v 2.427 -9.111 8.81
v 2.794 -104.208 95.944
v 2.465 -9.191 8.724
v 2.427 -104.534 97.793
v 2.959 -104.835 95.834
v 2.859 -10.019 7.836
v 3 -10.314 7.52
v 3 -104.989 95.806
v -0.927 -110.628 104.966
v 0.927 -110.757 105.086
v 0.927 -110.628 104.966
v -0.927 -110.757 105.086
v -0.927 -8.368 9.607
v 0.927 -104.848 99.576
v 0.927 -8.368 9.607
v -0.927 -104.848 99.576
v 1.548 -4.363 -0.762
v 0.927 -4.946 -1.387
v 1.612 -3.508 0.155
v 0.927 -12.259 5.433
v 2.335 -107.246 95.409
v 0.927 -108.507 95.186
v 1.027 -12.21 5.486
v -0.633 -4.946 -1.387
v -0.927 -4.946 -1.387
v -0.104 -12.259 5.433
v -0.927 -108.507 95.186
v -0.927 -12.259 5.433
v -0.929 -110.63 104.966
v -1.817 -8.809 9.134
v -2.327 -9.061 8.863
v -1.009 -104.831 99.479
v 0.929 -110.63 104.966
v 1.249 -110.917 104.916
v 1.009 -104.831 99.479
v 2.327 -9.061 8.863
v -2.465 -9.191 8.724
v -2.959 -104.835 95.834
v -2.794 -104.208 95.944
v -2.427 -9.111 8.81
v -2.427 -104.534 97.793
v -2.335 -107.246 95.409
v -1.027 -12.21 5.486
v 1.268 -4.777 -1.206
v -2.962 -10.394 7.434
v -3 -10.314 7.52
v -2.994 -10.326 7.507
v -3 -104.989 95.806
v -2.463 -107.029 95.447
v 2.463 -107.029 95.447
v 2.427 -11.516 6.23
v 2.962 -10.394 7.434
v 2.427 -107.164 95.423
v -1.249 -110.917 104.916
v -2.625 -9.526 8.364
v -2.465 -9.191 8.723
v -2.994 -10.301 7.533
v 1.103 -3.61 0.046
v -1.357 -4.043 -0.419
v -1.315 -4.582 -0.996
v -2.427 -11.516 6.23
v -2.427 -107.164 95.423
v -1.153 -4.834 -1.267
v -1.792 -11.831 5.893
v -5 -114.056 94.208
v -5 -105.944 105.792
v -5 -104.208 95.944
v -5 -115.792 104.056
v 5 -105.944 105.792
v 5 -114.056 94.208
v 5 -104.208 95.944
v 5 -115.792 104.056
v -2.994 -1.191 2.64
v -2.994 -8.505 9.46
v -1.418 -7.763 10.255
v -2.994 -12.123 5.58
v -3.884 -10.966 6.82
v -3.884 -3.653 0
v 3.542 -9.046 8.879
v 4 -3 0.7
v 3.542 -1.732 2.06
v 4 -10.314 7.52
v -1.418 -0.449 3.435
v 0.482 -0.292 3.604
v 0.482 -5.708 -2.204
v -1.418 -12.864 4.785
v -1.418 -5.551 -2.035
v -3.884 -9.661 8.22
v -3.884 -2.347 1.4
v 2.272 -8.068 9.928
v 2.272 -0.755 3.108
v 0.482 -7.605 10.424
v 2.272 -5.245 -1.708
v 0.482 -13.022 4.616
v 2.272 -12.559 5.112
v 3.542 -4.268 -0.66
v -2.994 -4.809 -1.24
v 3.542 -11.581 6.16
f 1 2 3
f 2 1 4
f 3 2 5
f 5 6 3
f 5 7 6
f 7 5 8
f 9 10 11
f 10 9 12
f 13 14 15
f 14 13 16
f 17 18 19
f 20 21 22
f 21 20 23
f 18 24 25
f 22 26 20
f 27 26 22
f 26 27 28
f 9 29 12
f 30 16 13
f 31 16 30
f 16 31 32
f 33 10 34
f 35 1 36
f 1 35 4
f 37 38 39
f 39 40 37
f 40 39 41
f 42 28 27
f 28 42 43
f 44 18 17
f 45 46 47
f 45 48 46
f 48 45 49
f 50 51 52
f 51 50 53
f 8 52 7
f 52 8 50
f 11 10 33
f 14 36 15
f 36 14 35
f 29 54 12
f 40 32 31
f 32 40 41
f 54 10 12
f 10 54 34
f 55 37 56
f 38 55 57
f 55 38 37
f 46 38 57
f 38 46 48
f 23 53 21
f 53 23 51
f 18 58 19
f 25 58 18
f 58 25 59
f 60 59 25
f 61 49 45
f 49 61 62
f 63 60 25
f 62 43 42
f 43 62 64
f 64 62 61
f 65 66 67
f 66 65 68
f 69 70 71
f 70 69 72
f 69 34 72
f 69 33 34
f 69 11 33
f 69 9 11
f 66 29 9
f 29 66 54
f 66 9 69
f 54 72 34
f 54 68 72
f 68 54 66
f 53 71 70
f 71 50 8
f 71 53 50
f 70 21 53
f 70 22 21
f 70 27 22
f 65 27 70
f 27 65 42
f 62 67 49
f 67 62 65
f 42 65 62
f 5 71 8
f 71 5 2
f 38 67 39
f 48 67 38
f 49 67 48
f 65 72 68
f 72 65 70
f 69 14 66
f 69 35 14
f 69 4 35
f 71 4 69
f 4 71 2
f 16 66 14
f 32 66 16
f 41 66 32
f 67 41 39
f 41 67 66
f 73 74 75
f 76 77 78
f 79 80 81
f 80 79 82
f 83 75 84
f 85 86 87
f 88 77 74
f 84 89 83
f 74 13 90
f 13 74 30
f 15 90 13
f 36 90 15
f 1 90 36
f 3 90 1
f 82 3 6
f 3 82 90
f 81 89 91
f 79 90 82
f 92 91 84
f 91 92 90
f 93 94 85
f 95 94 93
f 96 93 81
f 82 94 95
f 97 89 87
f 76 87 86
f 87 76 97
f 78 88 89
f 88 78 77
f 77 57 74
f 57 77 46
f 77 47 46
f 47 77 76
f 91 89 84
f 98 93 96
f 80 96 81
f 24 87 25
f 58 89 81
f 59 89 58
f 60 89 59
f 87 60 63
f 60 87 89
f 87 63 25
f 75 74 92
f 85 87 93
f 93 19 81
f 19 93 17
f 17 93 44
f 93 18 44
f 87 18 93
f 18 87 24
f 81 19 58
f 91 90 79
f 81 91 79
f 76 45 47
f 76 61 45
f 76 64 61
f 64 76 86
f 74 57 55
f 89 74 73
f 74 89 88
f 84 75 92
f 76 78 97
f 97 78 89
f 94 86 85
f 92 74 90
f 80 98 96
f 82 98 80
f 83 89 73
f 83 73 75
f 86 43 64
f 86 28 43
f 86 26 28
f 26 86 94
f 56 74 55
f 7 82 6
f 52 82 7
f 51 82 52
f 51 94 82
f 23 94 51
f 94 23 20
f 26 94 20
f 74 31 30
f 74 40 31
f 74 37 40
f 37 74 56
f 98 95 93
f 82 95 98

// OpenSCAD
module magnetometer(posx = 0, posy = 0, posz = 0) {
    translate([posx, posy, posz]) {
        translate([0,-3,.7])
        rotate([47,0,0])
        cylinder(h = 150, r = 3);
        
        translate([0,-110,100]) rotate([10,0,0]) cube(10, center = true);
        
        translate([0,-3,.7]) rotate([47,0,0]) cylinder(10,4,4);
    }
}

magnetometer();
